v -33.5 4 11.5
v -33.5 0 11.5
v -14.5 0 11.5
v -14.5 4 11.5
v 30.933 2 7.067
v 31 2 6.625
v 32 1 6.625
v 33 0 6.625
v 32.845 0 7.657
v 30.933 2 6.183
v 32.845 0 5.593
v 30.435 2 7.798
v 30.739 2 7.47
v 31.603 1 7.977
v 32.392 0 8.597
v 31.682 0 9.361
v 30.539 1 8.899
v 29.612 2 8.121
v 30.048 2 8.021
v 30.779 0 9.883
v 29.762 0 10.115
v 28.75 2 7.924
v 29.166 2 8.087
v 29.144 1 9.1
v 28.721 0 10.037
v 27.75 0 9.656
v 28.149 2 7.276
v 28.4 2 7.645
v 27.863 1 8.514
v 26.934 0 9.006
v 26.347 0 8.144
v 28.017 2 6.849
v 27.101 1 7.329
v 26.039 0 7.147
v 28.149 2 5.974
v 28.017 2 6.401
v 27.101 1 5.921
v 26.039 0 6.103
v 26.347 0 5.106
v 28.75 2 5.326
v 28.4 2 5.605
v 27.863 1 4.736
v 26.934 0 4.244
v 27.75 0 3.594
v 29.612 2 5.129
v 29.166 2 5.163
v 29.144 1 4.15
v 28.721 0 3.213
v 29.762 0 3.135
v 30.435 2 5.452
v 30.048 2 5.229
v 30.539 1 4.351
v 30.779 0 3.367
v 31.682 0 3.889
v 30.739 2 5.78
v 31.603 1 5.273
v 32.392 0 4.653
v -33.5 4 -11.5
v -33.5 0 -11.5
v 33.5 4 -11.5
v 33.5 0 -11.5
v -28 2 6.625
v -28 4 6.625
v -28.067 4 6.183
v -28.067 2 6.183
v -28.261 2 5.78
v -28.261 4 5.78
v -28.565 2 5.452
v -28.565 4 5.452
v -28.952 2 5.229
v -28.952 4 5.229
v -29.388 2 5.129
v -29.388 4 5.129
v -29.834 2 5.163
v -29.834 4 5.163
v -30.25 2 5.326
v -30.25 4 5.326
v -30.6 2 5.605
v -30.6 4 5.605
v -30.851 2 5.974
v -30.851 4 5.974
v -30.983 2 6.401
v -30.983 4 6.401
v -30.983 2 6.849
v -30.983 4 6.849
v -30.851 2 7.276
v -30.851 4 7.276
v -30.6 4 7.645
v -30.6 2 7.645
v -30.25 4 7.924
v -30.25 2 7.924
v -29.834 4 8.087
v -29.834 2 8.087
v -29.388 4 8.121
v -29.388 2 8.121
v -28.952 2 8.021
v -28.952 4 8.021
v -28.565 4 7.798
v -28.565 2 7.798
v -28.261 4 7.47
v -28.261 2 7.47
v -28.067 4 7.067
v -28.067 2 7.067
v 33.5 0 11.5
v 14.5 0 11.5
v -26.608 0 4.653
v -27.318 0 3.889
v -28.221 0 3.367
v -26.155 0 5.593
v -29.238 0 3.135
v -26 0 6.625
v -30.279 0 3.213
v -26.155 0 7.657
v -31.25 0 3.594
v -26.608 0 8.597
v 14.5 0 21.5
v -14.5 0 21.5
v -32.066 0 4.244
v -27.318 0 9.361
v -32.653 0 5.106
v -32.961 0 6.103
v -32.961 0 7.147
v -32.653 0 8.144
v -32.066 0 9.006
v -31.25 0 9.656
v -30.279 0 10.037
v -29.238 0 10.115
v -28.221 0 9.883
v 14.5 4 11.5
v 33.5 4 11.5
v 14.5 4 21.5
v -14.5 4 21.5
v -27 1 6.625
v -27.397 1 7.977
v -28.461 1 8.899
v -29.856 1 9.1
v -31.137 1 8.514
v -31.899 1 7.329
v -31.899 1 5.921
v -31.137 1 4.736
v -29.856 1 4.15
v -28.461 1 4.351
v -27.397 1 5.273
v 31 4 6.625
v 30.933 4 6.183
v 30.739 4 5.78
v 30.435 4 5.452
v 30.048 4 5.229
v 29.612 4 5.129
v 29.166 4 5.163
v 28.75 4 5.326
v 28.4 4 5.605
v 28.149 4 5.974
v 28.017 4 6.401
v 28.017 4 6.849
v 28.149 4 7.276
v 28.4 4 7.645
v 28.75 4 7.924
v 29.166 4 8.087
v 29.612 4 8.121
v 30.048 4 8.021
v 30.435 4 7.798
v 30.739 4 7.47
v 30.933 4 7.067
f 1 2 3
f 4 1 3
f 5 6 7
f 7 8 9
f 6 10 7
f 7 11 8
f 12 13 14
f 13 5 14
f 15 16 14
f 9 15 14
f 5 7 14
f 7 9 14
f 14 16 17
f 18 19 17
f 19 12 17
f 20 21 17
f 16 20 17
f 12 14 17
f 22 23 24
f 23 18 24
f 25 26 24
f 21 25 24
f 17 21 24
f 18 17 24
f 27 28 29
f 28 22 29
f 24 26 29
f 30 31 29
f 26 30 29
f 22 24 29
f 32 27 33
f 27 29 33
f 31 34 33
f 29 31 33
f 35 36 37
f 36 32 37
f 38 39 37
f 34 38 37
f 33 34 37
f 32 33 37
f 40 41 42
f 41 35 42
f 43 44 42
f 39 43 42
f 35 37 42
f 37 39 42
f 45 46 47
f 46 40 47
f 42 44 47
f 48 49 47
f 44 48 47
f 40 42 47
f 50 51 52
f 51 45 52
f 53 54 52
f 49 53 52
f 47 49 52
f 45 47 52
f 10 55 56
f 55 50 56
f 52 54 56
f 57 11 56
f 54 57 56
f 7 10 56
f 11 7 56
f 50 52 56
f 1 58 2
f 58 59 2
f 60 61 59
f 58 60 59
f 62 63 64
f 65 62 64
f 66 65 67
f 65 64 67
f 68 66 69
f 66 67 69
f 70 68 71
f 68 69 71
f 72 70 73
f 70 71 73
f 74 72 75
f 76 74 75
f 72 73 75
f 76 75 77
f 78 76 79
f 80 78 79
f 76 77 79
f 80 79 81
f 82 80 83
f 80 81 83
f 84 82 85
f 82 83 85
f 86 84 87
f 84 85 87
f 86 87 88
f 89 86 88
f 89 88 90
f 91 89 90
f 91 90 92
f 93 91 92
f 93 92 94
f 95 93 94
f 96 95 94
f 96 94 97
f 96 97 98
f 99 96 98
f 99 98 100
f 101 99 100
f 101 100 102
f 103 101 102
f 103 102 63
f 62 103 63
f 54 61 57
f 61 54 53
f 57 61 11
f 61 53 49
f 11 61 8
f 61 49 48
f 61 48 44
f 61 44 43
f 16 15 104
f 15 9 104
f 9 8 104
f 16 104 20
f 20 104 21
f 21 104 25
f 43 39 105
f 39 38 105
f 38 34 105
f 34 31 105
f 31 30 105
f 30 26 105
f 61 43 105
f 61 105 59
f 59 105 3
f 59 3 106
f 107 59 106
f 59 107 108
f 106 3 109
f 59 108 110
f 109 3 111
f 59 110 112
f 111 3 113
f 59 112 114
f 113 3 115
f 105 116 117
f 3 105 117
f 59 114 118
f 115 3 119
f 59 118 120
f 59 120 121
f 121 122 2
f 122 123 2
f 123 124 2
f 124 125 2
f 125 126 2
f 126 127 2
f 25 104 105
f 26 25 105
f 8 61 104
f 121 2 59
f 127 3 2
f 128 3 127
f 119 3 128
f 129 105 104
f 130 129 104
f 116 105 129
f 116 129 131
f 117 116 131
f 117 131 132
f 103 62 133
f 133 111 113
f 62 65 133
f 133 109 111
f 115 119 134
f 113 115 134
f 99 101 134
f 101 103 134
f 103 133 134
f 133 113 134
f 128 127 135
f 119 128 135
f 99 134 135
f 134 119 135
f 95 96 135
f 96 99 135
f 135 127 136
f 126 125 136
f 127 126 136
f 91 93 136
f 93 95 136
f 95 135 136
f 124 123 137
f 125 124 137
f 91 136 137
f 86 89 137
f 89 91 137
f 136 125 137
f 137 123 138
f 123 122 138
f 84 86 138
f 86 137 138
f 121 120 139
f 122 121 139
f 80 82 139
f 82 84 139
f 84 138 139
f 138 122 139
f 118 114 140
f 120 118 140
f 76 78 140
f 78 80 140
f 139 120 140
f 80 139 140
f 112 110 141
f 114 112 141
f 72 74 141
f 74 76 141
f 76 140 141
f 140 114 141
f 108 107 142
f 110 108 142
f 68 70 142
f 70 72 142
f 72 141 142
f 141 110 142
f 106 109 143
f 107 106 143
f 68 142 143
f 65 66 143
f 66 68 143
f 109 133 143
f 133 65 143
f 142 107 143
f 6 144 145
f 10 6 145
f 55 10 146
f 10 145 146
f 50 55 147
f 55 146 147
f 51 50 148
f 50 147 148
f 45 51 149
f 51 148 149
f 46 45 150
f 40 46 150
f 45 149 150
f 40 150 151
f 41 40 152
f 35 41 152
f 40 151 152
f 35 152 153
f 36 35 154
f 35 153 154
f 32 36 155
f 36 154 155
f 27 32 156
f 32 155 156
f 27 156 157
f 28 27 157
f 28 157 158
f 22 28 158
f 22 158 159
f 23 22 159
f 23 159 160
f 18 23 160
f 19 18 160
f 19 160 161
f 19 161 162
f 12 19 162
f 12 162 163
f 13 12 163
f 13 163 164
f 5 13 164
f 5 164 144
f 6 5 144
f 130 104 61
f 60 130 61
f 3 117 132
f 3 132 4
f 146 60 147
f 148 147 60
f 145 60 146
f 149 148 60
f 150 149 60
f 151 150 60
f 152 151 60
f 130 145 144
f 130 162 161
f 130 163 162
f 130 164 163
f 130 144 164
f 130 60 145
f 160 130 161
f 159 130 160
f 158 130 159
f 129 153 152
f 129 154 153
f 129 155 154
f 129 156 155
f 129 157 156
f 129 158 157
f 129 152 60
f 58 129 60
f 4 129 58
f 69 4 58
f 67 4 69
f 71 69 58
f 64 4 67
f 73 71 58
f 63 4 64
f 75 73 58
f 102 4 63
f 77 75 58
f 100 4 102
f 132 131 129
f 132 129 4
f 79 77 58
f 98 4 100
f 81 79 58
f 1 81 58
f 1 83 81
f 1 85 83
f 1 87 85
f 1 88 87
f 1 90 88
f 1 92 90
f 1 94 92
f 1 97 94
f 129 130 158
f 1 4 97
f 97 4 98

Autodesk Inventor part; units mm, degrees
ref_plane "YZ Plane" through (0, 0, 0) normal (1, 0, 0) x (0, 1, 0)
ref_plane "XZ Plane" through (0, 0, 0) normal (0, 1, 0) x (-1, 0, 0)
ref_plane "XY Plane" through (0, 0, 0) normal (0, 0, 1) x (1, 0, 0)
sketch "Sketch1" plane through (0, 0, 0) normal (0, 1, 0) x (-1, 0, 0)
  line L0 (-33.5, -11.5) -> (33.5, -11.5)
  line L1 (33.5, -11.5) -> (33.5, 11.5)
  line L2 (33.5, 11.5) -> (-33.5, 11.5)
  line L3 (-33.5, 11.5) -> (-33.5, -11.5)
  line L4 (-33.5, -11.5) -> (33.5, 11.5) construction
  line L5 (33.5, -11.5) -> (-33.5, 11.5) construction
  line L6 (-14.5, 21.5) -> (14.5, 21.5)
  line L7 (14.5, 21.5) -> (14.5, 11.5)
  line L8 (14.5, 11.5) -> (-14.5, 11.5)
  line L9 (-14.5, 11.5) -> (-14.5, 21.5)
  line L10 (-14.5, 21.5) -> (14.5, 11.5) construction
  line L11 (14.5, 21.5) -> (-14.5, 11.5) construction
  point P0 (0, 0)
  point P1 (0, 16.5)
  point P2 (0, 0)
  point P3 (0, 16.5)
  point P4 (-14.5, 11.5)
  dimension "d0" = 67
  dimension "d1" = 23
  dimension "d2" = 29
  dimension "d3" = 10
extrude "Extrusion1" add sketch "Sketch1" along normal blind 4
sketch "Sketch2" plane through (0, 4, 0) normal (0, 1, 0) x (1, 0, 0)
  circle A0 centre (-29.5, -6.625) radius 1.5
  circle A1 centre (29.5, -6.625) radius 1.5
  line L0 (33.5, -11.5) -> (33.5, 11.5) projected
  line L1 (-33.5, 11.5) -> (-33.5, -11.5) projected
  line L2 (33.5, 11.5) -> (-33.5, 11.5) projected
  point P0 (0, 0)
  dimension "d6" = 4
  dimension "d7" = 4
  dimension "d8" = 18.125
  dimension "d9" = 18.125
  dimension "d10" = 3
extrude "Extrusion2" cut sketch "Sketch2" against normal through all
chamfer "Chamfer1" distance 2 angle 45 2 edges at (28, 0, 6.625) (-31, 0, 6.625)
equation "\"d7\" = d6"
equation "\"d9\" = d8"
properties part number "WeightFront" material "Lead"
